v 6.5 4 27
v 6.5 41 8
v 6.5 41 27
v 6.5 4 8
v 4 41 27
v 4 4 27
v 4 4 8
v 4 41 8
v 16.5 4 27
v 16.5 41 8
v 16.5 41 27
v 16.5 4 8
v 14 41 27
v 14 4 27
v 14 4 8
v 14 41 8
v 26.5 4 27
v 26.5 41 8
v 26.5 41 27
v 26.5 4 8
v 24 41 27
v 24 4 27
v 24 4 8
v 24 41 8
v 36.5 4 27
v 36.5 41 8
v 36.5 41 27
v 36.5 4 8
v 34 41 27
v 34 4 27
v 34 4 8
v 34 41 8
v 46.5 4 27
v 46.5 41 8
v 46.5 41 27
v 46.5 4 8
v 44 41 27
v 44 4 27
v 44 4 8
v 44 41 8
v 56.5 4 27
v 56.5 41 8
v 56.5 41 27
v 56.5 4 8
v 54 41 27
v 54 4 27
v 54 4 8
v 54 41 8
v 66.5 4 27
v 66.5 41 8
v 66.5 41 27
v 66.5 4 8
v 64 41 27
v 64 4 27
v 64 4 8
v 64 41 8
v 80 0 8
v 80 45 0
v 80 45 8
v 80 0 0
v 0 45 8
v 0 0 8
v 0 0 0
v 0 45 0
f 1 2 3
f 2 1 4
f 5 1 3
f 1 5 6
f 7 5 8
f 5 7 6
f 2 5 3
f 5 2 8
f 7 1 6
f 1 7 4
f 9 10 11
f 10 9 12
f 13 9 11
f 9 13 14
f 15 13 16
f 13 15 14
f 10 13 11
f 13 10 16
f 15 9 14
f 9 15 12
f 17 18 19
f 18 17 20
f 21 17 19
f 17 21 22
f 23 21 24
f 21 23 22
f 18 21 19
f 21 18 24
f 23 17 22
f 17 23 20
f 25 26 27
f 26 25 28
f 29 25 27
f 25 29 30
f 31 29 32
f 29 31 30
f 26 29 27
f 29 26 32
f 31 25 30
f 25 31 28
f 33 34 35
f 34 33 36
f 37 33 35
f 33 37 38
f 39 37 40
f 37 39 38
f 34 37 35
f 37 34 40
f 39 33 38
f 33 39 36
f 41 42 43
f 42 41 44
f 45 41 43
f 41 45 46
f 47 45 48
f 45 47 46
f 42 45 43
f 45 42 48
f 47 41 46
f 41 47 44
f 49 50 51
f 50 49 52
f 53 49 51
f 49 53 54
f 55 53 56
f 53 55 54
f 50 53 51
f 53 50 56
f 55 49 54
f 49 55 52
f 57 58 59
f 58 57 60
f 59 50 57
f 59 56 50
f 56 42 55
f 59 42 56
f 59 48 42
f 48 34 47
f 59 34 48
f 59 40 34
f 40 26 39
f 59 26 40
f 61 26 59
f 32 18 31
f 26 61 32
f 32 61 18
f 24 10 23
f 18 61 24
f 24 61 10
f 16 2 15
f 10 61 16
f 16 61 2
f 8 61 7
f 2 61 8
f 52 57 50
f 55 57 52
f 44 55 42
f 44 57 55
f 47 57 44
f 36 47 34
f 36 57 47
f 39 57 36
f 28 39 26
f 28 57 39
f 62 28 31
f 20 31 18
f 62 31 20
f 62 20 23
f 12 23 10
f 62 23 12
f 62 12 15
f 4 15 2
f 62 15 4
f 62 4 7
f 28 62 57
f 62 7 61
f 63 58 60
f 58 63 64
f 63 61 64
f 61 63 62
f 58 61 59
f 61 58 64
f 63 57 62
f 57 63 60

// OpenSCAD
$fn = 32;

// ----------------------------------------------------------------------
// Heatsink: uniform fin block
// ----------------------------------------------------------------------

// --- parameters (mm) ---
base_l = 80;              // base length, X
base_w = 45;              // base width, Y
base_t = 8;               // base plate thickness
fin_h = 20;               // fin height above the base
fin_t = 2.5;              // fin thickness
edge = 4;                 // margin from the base ends
pitch = 10;               // fin pitch
fit_tol = 0.1;            // tolerance for press fits, mm
free_tol = 0.3;           // tolerance for clearance fits, mm

n_fins = floor((base_l - 2 * edge - fin_t) / pitch) + 1;  // fin count
total_h = base_t + fin_h - 1;  // overall height

union() {
  cube([base_l, base_w, base_t]);
  for (i = [0 : n_fins - 1])
    translate([edge + i * pitch, edge, base_t - 1])
      cube([fin_t, base_w - 2 * edge, fin_h]);
}
